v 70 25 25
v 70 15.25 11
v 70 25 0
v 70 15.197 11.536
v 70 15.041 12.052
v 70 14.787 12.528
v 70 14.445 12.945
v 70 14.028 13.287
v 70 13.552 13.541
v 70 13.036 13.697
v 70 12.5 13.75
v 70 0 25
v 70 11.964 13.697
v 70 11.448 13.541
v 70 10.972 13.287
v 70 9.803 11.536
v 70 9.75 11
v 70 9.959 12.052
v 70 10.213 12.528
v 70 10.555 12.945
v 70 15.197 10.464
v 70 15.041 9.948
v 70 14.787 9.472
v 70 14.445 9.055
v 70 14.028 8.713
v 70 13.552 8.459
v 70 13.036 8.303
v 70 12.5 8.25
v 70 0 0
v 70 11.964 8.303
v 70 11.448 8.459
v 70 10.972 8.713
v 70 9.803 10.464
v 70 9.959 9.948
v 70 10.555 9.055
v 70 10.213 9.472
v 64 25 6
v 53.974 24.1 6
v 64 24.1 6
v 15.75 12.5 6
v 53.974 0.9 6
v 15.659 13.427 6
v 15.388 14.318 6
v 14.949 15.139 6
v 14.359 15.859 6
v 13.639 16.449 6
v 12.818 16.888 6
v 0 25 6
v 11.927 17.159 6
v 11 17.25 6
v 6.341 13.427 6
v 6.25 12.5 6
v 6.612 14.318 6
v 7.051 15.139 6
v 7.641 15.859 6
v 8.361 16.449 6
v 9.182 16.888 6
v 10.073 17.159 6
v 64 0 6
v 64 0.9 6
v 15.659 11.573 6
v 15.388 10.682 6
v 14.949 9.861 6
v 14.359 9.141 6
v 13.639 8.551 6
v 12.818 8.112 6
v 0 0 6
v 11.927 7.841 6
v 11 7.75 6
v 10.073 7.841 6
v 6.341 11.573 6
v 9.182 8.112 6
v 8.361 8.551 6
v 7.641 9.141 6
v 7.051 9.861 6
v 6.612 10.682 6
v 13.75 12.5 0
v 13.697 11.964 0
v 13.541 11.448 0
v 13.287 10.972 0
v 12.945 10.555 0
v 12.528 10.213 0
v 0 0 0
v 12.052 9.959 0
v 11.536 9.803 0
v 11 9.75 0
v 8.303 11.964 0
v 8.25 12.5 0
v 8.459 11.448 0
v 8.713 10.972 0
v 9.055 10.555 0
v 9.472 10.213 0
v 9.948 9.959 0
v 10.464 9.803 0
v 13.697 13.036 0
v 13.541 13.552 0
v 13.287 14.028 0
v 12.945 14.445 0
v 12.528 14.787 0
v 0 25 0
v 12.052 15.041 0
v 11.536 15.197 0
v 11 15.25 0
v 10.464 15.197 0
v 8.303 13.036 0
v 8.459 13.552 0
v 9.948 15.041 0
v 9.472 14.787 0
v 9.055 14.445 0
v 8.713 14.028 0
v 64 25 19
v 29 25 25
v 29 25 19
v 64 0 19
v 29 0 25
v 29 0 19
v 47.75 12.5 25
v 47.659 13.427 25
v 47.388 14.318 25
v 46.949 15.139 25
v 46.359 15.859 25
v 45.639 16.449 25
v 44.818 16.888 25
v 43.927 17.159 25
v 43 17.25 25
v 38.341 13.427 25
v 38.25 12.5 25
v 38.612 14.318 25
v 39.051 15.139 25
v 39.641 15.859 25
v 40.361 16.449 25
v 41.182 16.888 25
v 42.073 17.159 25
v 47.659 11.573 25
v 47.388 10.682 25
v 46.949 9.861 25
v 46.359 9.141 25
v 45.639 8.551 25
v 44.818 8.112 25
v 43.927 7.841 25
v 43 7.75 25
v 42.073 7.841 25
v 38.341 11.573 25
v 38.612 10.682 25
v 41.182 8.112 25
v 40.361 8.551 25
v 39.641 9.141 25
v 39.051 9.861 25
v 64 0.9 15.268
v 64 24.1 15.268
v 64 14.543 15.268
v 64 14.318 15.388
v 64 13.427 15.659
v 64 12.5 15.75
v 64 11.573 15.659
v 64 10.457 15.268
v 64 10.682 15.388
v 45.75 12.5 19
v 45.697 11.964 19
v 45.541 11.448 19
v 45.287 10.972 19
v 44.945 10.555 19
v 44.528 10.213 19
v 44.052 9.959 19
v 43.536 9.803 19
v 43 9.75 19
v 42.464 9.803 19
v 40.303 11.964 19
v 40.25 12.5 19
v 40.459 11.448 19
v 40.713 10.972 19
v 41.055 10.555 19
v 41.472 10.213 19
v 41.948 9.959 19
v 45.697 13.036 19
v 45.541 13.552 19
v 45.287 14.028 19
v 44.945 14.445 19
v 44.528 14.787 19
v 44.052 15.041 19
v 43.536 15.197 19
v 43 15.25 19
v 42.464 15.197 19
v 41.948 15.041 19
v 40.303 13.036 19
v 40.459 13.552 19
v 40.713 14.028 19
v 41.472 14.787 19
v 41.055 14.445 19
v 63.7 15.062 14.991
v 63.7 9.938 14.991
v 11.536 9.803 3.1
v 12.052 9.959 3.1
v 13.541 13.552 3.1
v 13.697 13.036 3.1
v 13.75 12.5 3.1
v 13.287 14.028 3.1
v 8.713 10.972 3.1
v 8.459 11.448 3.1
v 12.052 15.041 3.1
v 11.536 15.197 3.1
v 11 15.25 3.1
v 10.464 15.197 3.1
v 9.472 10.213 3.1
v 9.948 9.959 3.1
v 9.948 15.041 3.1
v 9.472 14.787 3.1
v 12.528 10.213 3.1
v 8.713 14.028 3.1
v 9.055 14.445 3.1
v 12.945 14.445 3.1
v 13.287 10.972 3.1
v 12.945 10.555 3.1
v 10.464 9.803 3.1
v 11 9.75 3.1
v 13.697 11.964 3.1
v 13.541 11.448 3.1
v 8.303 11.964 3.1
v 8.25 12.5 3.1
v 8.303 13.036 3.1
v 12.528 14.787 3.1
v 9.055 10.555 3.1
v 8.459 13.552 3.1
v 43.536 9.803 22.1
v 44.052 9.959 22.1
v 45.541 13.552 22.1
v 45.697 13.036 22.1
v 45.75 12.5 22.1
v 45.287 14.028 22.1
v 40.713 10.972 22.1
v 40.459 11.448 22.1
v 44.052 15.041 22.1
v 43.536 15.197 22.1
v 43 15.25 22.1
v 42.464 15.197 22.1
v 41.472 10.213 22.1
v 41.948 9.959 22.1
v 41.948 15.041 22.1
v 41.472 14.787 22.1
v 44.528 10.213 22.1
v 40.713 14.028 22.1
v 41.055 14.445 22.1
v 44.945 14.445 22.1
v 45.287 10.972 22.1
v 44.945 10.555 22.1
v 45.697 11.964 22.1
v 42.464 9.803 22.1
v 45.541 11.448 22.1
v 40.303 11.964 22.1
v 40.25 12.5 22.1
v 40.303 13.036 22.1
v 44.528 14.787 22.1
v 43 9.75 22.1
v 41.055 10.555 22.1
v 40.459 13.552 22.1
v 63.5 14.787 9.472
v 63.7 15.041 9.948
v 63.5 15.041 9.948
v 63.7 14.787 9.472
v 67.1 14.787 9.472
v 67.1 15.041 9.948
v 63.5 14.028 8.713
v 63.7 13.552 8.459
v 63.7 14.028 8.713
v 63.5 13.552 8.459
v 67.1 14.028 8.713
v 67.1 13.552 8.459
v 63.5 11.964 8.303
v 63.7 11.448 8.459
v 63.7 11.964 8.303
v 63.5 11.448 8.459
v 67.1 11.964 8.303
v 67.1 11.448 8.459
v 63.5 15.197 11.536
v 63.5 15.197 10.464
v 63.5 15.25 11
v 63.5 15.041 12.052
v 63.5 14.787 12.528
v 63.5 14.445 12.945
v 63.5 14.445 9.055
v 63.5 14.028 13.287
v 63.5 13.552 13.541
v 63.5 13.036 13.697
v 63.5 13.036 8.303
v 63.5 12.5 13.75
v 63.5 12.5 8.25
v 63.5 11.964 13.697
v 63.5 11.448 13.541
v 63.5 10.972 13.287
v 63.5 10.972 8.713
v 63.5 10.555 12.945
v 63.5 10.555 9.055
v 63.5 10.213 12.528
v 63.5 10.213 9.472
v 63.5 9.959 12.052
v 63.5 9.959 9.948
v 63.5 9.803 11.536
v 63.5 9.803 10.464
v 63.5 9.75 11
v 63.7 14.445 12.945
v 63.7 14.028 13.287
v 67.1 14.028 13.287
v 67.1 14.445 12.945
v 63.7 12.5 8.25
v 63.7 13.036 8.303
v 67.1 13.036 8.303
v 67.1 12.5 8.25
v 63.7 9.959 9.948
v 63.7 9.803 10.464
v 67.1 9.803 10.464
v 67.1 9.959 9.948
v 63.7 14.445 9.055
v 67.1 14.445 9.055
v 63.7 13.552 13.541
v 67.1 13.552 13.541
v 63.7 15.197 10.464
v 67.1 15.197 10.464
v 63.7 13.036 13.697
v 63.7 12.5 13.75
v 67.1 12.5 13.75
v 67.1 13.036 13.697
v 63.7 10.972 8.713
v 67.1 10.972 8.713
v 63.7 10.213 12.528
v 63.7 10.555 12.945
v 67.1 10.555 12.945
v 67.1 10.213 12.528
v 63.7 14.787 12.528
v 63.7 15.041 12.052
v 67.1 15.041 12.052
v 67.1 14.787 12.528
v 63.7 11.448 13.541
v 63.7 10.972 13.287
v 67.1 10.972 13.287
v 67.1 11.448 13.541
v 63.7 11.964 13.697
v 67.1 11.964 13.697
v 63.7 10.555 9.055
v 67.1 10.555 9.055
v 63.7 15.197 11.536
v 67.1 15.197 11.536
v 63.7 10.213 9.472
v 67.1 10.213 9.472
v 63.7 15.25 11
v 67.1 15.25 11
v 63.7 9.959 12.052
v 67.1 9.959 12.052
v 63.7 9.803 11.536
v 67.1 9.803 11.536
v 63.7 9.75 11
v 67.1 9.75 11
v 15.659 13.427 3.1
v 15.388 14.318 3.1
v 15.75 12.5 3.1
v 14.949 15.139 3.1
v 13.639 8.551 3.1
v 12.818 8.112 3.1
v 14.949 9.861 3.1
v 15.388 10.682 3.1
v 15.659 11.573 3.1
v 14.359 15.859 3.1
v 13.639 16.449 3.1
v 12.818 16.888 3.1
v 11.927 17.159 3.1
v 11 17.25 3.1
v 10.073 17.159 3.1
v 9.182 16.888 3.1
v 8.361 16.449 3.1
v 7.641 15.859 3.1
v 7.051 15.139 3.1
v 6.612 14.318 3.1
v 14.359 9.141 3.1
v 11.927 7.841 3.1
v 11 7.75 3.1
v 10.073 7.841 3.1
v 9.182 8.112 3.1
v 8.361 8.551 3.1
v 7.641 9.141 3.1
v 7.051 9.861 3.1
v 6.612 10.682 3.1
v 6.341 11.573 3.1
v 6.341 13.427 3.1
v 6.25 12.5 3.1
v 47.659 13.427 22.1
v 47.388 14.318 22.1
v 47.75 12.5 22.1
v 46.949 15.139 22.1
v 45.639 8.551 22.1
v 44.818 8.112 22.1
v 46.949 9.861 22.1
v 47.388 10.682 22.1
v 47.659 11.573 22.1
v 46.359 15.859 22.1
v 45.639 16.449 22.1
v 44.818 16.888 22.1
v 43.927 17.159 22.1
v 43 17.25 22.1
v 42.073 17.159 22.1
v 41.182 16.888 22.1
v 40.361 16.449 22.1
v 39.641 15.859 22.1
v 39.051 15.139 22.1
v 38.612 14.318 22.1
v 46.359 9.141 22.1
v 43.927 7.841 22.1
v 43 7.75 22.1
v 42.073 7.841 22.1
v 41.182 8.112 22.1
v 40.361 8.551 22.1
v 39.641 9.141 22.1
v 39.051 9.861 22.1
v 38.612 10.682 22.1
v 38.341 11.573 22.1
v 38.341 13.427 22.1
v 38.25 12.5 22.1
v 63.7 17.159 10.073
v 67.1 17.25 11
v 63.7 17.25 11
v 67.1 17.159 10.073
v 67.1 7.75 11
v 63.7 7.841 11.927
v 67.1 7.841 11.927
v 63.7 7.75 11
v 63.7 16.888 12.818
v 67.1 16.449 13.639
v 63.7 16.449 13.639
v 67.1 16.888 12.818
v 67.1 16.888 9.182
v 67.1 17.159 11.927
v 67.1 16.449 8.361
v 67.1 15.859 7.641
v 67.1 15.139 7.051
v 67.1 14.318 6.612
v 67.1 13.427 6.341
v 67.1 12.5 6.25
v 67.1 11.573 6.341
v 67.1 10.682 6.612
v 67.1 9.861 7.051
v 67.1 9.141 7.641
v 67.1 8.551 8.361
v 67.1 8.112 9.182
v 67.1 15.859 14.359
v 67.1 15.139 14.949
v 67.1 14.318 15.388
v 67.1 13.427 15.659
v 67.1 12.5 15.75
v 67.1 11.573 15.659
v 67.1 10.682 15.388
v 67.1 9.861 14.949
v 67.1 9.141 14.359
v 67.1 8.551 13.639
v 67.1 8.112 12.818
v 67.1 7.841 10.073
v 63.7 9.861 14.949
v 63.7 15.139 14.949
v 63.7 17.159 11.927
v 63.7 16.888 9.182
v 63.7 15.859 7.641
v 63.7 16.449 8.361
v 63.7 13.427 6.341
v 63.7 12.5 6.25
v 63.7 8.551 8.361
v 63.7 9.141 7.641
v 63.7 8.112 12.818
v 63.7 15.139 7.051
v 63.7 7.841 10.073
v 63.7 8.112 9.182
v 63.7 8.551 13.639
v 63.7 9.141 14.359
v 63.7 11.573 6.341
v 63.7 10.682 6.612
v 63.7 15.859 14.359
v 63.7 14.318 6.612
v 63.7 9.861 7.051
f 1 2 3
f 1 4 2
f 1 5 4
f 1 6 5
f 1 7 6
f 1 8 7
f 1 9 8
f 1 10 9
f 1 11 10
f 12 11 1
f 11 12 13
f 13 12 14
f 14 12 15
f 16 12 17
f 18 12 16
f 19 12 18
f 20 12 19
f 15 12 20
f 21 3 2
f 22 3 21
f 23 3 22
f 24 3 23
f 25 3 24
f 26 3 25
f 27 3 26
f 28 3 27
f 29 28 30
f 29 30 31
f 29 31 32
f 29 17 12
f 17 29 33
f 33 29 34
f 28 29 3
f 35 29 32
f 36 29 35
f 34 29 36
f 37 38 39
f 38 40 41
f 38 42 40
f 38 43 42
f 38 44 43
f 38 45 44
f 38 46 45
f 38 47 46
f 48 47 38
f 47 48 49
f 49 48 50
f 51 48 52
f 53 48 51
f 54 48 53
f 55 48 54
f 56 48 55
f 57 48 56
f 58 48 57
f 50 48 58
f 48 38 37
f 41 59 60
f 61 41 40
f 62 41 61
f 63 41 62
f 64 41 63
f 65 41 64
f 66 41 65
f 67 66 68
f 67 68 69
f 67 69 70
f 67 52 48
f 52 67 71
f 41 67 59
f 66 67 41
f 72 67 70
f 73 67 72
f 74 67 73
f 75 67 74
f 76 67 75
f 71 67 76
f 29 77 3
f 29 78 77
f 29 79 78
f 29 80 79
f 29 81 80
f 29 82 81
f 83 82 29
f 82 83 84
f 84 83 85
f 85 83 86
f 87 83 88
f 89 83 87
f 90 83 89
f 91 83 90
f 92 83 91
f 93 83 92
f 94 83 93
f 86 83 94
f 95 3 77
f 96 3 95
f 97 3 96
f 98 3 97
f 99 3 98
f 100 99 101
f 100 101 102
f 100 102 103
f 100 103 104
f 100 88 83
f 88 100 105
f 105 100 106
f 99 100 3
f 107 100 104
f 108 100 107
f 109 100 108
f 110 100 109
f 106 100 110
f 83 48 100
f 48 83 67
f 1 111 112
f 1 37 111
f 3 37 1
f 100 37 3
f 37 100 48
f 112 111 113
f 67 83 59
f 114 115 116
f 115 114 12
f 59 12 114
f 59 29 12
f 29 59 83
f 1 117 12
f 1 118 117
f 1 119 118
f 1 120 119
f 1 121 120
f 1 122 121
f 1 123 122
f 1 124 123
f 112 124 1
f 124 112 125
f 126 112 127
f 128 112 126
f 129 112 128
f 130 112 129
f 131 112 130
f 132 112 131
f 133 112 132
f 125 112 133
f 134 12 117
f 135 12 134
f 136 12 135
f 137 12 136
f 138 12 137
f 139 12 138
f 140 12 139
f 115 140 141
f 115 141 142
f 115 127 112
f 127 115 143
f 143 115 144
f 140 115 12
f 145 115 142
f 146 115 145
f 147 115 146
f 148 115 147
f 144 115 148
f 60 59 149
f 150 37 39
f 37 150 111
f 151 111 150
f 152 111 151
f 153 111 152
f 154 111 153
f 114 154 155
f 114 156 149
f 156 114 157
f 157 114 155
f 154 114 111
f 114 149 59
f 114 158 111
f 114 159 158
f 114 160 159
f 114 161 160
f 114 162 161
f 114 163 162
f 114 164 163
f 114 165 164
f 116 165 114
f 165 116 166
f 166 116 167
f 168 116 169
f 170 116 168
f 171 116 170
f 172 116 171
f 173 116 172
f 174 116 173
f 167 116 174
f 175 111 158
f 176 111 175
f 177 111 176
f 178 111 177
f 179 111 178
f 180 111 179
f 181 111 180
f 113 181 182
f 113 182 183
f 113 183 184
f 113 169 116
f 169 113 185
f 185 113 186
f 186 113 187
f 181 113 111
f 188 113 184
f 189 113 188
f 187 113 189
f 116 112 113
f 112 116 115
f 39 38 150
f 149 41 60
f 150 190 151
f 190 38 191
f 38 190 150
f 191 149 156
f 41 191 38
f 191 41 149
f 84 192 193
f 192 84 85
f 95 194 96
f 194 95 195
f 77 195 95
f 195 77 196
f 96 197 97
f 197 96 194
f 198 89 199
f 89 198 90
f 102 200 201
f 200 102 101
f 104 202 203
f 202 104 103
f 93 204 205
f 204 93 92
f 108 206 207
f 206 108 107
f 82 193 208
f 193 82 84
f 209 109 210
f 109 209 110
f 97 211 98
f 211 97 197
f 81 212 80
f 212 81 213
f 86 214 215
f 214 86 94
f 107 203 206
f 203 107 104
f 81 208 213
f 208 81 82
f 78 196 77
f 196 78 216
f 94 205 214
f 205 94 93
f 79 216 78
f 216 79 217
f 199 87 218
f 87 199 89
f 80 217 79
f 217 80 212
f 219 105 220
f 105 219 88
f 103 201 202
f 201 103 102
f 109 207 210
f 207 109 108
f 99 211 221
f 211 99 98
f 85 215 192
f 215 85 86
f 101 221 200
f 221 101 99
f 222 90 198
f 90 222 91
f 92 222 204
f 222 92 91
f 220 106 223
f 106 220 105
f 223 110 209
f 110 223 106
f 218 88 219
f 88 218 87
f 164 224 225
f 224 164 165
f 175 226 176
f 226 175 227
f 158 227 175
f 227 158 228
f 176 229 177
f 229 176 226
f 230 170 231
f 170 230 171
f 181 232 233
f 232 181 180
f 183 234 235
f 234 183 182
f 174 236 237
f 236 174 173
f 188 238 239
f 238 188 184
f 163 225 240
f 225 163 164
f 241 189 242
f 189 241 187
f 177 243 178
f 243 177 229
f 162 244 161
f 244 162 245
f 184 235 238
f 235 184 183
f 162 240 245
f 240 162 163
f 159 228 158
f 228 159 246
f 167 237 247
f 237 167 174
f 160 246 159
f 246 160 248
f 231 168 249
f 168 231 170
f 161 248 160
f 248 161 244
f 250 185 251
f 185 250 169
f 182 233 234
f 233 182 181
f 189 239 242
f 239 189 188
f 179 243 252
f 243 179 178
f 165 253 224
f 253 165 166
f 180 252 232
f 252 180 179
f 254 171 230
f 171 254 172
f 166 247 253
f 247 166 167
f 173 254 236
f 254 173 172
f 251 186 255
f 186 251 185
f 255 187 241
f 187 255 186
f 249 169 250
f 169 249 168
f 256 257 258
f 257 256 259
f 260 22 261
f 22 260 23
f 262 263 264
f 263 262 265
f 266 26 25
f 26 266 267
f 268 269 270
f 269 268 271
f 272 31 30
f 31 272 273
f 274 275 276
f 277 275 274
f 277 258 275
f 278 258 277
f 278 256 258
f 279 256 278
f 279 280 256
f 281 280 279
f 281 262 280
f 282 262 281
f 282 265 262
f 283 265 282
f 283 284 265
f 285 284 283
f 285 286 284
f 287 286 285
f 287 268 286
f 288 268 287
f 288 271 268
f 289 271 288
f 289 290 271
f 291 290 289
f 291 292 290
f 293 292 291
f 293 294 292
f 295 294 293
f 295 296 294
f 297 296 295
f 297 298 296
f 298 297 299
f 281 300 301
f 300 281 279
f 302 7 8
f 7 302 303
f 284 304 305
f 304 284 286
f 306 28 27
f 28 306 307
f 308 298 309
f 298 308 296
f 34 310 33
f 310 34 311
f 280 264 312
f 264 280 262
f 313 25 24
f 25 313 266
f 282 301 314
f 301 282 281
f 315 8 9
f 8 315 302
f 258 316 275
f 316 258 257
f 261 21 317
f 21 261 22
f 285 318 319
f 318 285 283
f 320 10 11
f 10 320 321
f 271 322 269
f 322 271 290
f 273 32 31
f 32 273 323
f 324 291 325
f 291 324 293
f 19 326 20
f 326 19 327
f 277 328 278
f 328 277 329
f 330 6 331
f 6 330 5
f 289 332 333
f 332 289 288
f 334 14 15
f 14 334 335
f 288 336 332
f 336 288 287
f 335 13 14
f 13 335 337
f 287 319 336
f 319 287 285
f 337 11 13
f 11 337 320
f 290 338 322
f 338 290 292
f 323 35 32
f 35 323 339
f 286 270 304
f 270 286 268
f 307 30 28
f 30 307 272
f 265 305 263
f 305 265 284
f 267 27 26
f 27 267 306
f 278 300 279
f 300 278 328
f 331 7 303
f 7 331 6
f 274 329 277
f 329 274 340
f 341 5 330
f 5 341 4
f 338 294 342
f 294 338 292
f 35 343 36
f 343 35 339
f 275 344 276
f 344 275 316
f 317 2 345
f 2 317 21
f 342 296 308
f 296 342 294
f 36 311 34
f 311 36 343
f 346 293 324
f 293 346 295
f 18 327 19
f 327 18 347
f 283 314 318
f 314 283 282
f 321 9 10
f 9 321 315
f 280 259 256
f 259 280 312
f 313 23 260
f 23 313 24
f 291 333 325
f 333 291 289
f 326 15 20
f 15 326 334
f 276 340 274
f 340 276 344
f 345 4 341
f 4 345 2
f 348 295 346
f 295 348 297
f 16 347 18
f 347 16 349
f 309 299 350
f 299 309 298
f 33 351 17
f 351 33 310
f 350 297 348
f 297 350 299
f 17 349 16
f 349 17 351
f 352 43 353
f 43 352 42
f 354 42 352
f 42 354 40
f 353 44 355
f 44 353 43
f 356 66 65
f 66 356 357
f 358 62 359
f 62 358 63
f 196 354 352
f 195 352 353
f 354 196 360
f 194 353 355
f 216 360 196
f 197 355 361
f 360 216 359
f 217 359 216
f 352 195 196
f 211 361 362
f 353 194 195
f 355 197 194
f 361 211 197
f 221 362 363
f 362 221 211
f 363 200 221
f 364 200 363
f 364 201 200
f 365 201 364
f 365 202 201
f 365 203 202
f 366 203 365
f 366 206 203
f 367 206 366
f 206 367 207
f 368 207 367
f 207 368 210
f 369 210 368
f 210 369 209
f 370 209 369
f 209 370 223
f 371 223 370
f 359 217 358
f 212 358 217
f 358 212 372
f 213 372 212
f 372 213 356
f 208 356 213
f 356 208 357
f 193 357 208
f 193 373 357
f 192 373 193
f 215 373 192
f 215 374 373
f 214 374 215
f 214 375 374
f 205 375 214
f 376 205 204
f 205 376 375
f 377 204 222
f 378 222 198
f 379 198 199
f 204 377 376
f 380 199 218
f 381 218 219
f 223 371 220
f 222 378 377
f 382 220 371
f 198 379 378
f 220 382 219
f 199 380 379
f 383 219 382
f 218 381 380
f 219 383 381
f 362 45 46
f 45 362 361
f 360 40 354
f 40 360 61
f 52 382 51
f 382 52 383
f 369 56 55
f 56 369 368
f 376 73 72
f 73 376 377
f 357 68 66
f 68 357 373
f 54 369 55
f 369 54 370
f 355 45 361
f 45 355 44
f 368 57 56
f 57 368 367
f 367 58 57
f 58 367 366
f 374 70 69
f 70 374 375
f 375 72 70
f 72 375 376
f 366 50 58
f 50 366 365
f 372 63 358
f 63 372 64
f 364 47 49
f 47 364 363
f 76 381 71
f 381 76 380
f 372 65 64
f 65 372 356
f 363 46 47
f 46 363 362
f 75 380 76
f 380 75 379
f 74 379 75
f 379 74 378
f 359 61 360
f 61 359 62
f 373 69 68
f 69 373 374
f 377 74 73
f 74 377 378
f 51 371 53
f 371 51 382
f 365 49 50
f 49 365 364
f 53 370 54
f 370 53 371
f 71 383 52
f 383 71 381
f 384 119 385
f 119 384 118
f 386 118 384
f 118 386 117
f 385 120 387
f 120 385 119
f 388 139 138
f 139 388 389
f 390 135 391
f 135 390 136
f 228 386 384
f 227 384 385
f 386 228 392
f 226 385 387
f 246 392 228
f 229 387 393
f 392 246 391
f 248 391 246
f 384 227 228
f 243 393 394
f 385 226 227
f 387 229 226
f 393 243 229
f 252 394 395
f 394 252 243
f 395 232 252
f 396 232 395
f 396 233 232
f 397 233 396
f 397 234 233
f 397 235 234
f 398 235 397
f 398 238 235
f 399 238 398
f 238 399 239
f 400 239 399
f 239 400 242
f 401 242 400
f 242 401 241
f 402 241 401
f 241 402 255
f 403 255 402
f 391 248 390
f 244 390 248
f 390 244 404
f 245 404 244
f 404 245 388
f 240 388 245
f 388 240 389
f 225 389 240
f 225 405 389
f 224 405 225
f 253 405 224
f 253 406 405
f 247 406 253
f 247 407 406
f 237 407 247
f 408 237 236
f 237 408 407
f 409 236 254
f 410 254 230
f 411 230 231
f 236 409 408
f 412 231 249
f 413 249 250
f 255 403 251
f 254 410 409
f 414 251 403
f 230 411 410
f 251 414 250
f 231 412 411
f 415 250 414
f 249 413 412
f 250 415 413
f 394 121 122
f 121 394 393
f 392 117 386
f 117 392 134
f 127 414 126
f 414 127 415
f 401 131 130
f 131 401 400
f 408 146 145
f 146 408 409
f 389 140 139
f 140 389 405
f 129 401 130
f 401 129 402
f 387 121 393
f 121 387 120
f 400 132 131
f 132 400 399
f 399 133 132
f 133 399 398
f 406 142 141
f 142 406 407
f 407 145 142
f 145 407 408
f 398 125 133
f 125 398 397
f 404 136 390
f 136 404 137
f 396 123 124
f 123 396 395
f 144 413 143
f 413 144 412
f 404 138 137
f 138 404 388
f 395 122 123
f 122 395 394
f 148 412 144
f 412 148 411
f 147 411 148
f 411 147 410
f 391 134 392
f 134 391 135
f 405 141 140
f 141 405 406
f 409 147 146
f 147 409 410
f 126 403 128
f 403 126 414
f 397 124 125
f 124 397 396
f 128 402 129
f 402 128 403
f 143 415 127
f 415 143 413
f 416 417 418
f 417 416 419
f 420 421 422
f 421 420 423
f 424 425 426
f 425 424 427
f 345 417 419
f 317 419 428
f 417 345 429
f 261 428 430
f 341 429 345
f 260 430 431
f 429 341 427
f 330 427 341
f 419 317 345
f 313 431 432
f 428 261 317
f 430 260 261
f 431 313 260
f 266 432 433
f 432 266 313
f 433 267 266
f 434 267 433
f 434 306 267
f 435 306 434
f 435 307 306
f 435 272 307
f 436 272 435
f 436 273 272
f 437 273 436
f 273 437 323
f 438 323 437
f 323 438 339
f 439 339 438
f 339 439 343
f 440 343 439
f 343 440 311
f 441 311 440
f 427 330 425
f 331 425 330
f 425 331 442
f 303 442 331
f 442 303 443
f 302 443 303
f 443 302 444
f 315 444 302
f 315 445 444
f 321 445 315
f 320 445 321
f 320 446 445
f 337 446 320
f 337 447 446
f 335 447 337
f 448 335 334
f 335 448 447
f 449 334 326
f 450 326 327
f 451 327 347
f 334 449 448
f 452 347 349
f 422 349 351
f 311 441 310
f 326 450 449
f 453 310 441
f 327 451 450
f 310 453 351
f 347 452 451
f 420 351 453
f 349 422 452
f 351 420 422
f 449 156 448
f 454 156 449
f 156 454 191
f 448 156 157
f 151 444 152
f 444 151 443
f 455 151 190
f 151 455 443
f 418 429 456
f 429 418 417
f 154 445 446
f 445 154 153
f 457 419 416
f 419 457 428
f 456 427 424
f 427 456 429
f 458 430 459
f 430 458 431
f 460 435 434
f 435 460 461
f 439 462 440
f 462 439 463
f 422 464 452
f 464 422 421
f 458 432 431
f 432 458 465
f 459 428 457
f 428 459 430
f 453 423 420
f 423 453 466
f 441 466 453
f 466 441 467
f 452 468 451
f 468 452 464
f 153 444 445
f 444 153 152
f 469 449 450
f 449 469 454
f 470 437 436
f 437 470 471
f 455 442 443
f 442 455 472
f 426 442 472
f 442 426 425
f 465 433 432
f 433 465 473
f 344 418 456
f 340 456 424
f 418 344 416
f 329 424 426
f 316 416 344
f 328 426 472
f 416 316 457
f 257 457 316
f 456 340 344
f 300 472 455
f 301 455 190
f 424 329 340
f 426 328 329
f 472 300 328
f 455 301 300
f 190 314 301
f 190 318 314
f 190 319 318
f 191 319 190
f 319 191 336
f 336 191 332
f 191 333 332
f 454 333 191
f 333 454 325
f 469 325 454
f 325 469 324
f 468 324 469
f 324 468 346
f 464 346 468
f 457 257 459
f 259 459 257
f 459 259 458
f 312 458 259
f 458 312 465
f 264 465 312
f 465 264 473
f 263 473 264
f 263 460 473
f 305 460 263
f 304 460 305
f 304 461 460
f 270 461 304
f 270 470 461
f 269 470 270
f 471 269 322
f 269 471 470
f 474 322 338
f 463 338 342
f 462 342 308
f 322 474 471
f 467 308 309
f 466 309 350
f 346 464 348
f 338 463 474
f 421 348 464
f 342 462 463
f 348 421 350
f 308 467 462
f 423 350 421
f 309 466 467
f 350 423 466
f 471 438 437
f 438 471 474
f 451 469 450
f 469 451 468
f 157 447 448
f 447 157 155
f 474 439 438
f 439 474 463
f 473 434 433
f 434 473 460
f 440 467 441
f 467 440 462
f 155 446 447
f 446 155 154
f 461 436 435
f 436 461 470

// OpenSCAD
$fn = 32;

// ----------------------------------------------------------------------
// Z-bracket: 70 x 25 x 25 mm
// ----------------------------------------------------------------------

// --- parameters (mm) ---
lower_len = 70;           // lower foot length, X
upper_len = 35;           // upper foot length, X
width = 25;               // bracket width, Y
rise = 25;                // overall rise, Z
thick = 6;                // plate thickness
hole_d = 5.5;             // clearance for M5
cb_d = 9.5;               // counterbore diameter
cb_h = 2.9;               // counterbore depth
rib_len = 11;             // gusset leg
rib_sink = 0.9;           // gusset overlap into the plates

module hole_z(px, py, z0) {
  translate([px, py, z0 - 0.5]) cylinder(h = thick + 1, d = hole_d);
}
module hole_x(py, pz) {
  translate([-0.5, py, pz]) rotate([0, 90, 0]) cylinder(h = thick + 1, d = hole_d);
}
module cb_z(px, py, top_z) {
  translate([px, py, top_z - cb_h]) cylinder(h = cb_h + 0.5, d = cb_d);
}
module cb_x(py, pz) {
  translate([thick - cb_h, py, pz]) rotate([0, -90, 0]) cylinder(h = cb_h + 0.5, d = cb_d);
}
module gusset(x0) {
  translate([x0, width - rib_sink, 0])
    rotate([90, 0, 0])
      linear_extrude(height = width - 2 * rib_sink)
        polygon(points = [[rib_sink, thick - rib_sink],
                          [rib_sink, thick - rib_sink + rib_len],
                          [-rib_len, thick - rib_sink]]);
}

difference() {
  union() {
    cube([lower_len, width, thick]);
    /* web, overlapping the lower foot */
    translate([lower_len - thick, 0, 0]) cube([thick, width, rise]);
    /* upper foot, sunk into the web */
    translate([lower_len - thick - upper_len, 0, rise - thick]) cube([upper_len + thick, width, thick]);
    gusset(lower_len - thick);
  }
  hole_z(11, 12.5, 0);
  translate([lower_len - thick - 21, 0, 0]) hole_z(0, 12.5, rise - thick);
  translate([lower_len - thick, 0, 0]) hole_x(12.5, 11);
  cb_z(11, 12.5, thick);
  translate([lower_len - thick - 21, 0, 0]) cb_z(0, 12.5, rise);
  translate([lower_len - thick, 0, 0]) cb_x(12.5, 11);
}
